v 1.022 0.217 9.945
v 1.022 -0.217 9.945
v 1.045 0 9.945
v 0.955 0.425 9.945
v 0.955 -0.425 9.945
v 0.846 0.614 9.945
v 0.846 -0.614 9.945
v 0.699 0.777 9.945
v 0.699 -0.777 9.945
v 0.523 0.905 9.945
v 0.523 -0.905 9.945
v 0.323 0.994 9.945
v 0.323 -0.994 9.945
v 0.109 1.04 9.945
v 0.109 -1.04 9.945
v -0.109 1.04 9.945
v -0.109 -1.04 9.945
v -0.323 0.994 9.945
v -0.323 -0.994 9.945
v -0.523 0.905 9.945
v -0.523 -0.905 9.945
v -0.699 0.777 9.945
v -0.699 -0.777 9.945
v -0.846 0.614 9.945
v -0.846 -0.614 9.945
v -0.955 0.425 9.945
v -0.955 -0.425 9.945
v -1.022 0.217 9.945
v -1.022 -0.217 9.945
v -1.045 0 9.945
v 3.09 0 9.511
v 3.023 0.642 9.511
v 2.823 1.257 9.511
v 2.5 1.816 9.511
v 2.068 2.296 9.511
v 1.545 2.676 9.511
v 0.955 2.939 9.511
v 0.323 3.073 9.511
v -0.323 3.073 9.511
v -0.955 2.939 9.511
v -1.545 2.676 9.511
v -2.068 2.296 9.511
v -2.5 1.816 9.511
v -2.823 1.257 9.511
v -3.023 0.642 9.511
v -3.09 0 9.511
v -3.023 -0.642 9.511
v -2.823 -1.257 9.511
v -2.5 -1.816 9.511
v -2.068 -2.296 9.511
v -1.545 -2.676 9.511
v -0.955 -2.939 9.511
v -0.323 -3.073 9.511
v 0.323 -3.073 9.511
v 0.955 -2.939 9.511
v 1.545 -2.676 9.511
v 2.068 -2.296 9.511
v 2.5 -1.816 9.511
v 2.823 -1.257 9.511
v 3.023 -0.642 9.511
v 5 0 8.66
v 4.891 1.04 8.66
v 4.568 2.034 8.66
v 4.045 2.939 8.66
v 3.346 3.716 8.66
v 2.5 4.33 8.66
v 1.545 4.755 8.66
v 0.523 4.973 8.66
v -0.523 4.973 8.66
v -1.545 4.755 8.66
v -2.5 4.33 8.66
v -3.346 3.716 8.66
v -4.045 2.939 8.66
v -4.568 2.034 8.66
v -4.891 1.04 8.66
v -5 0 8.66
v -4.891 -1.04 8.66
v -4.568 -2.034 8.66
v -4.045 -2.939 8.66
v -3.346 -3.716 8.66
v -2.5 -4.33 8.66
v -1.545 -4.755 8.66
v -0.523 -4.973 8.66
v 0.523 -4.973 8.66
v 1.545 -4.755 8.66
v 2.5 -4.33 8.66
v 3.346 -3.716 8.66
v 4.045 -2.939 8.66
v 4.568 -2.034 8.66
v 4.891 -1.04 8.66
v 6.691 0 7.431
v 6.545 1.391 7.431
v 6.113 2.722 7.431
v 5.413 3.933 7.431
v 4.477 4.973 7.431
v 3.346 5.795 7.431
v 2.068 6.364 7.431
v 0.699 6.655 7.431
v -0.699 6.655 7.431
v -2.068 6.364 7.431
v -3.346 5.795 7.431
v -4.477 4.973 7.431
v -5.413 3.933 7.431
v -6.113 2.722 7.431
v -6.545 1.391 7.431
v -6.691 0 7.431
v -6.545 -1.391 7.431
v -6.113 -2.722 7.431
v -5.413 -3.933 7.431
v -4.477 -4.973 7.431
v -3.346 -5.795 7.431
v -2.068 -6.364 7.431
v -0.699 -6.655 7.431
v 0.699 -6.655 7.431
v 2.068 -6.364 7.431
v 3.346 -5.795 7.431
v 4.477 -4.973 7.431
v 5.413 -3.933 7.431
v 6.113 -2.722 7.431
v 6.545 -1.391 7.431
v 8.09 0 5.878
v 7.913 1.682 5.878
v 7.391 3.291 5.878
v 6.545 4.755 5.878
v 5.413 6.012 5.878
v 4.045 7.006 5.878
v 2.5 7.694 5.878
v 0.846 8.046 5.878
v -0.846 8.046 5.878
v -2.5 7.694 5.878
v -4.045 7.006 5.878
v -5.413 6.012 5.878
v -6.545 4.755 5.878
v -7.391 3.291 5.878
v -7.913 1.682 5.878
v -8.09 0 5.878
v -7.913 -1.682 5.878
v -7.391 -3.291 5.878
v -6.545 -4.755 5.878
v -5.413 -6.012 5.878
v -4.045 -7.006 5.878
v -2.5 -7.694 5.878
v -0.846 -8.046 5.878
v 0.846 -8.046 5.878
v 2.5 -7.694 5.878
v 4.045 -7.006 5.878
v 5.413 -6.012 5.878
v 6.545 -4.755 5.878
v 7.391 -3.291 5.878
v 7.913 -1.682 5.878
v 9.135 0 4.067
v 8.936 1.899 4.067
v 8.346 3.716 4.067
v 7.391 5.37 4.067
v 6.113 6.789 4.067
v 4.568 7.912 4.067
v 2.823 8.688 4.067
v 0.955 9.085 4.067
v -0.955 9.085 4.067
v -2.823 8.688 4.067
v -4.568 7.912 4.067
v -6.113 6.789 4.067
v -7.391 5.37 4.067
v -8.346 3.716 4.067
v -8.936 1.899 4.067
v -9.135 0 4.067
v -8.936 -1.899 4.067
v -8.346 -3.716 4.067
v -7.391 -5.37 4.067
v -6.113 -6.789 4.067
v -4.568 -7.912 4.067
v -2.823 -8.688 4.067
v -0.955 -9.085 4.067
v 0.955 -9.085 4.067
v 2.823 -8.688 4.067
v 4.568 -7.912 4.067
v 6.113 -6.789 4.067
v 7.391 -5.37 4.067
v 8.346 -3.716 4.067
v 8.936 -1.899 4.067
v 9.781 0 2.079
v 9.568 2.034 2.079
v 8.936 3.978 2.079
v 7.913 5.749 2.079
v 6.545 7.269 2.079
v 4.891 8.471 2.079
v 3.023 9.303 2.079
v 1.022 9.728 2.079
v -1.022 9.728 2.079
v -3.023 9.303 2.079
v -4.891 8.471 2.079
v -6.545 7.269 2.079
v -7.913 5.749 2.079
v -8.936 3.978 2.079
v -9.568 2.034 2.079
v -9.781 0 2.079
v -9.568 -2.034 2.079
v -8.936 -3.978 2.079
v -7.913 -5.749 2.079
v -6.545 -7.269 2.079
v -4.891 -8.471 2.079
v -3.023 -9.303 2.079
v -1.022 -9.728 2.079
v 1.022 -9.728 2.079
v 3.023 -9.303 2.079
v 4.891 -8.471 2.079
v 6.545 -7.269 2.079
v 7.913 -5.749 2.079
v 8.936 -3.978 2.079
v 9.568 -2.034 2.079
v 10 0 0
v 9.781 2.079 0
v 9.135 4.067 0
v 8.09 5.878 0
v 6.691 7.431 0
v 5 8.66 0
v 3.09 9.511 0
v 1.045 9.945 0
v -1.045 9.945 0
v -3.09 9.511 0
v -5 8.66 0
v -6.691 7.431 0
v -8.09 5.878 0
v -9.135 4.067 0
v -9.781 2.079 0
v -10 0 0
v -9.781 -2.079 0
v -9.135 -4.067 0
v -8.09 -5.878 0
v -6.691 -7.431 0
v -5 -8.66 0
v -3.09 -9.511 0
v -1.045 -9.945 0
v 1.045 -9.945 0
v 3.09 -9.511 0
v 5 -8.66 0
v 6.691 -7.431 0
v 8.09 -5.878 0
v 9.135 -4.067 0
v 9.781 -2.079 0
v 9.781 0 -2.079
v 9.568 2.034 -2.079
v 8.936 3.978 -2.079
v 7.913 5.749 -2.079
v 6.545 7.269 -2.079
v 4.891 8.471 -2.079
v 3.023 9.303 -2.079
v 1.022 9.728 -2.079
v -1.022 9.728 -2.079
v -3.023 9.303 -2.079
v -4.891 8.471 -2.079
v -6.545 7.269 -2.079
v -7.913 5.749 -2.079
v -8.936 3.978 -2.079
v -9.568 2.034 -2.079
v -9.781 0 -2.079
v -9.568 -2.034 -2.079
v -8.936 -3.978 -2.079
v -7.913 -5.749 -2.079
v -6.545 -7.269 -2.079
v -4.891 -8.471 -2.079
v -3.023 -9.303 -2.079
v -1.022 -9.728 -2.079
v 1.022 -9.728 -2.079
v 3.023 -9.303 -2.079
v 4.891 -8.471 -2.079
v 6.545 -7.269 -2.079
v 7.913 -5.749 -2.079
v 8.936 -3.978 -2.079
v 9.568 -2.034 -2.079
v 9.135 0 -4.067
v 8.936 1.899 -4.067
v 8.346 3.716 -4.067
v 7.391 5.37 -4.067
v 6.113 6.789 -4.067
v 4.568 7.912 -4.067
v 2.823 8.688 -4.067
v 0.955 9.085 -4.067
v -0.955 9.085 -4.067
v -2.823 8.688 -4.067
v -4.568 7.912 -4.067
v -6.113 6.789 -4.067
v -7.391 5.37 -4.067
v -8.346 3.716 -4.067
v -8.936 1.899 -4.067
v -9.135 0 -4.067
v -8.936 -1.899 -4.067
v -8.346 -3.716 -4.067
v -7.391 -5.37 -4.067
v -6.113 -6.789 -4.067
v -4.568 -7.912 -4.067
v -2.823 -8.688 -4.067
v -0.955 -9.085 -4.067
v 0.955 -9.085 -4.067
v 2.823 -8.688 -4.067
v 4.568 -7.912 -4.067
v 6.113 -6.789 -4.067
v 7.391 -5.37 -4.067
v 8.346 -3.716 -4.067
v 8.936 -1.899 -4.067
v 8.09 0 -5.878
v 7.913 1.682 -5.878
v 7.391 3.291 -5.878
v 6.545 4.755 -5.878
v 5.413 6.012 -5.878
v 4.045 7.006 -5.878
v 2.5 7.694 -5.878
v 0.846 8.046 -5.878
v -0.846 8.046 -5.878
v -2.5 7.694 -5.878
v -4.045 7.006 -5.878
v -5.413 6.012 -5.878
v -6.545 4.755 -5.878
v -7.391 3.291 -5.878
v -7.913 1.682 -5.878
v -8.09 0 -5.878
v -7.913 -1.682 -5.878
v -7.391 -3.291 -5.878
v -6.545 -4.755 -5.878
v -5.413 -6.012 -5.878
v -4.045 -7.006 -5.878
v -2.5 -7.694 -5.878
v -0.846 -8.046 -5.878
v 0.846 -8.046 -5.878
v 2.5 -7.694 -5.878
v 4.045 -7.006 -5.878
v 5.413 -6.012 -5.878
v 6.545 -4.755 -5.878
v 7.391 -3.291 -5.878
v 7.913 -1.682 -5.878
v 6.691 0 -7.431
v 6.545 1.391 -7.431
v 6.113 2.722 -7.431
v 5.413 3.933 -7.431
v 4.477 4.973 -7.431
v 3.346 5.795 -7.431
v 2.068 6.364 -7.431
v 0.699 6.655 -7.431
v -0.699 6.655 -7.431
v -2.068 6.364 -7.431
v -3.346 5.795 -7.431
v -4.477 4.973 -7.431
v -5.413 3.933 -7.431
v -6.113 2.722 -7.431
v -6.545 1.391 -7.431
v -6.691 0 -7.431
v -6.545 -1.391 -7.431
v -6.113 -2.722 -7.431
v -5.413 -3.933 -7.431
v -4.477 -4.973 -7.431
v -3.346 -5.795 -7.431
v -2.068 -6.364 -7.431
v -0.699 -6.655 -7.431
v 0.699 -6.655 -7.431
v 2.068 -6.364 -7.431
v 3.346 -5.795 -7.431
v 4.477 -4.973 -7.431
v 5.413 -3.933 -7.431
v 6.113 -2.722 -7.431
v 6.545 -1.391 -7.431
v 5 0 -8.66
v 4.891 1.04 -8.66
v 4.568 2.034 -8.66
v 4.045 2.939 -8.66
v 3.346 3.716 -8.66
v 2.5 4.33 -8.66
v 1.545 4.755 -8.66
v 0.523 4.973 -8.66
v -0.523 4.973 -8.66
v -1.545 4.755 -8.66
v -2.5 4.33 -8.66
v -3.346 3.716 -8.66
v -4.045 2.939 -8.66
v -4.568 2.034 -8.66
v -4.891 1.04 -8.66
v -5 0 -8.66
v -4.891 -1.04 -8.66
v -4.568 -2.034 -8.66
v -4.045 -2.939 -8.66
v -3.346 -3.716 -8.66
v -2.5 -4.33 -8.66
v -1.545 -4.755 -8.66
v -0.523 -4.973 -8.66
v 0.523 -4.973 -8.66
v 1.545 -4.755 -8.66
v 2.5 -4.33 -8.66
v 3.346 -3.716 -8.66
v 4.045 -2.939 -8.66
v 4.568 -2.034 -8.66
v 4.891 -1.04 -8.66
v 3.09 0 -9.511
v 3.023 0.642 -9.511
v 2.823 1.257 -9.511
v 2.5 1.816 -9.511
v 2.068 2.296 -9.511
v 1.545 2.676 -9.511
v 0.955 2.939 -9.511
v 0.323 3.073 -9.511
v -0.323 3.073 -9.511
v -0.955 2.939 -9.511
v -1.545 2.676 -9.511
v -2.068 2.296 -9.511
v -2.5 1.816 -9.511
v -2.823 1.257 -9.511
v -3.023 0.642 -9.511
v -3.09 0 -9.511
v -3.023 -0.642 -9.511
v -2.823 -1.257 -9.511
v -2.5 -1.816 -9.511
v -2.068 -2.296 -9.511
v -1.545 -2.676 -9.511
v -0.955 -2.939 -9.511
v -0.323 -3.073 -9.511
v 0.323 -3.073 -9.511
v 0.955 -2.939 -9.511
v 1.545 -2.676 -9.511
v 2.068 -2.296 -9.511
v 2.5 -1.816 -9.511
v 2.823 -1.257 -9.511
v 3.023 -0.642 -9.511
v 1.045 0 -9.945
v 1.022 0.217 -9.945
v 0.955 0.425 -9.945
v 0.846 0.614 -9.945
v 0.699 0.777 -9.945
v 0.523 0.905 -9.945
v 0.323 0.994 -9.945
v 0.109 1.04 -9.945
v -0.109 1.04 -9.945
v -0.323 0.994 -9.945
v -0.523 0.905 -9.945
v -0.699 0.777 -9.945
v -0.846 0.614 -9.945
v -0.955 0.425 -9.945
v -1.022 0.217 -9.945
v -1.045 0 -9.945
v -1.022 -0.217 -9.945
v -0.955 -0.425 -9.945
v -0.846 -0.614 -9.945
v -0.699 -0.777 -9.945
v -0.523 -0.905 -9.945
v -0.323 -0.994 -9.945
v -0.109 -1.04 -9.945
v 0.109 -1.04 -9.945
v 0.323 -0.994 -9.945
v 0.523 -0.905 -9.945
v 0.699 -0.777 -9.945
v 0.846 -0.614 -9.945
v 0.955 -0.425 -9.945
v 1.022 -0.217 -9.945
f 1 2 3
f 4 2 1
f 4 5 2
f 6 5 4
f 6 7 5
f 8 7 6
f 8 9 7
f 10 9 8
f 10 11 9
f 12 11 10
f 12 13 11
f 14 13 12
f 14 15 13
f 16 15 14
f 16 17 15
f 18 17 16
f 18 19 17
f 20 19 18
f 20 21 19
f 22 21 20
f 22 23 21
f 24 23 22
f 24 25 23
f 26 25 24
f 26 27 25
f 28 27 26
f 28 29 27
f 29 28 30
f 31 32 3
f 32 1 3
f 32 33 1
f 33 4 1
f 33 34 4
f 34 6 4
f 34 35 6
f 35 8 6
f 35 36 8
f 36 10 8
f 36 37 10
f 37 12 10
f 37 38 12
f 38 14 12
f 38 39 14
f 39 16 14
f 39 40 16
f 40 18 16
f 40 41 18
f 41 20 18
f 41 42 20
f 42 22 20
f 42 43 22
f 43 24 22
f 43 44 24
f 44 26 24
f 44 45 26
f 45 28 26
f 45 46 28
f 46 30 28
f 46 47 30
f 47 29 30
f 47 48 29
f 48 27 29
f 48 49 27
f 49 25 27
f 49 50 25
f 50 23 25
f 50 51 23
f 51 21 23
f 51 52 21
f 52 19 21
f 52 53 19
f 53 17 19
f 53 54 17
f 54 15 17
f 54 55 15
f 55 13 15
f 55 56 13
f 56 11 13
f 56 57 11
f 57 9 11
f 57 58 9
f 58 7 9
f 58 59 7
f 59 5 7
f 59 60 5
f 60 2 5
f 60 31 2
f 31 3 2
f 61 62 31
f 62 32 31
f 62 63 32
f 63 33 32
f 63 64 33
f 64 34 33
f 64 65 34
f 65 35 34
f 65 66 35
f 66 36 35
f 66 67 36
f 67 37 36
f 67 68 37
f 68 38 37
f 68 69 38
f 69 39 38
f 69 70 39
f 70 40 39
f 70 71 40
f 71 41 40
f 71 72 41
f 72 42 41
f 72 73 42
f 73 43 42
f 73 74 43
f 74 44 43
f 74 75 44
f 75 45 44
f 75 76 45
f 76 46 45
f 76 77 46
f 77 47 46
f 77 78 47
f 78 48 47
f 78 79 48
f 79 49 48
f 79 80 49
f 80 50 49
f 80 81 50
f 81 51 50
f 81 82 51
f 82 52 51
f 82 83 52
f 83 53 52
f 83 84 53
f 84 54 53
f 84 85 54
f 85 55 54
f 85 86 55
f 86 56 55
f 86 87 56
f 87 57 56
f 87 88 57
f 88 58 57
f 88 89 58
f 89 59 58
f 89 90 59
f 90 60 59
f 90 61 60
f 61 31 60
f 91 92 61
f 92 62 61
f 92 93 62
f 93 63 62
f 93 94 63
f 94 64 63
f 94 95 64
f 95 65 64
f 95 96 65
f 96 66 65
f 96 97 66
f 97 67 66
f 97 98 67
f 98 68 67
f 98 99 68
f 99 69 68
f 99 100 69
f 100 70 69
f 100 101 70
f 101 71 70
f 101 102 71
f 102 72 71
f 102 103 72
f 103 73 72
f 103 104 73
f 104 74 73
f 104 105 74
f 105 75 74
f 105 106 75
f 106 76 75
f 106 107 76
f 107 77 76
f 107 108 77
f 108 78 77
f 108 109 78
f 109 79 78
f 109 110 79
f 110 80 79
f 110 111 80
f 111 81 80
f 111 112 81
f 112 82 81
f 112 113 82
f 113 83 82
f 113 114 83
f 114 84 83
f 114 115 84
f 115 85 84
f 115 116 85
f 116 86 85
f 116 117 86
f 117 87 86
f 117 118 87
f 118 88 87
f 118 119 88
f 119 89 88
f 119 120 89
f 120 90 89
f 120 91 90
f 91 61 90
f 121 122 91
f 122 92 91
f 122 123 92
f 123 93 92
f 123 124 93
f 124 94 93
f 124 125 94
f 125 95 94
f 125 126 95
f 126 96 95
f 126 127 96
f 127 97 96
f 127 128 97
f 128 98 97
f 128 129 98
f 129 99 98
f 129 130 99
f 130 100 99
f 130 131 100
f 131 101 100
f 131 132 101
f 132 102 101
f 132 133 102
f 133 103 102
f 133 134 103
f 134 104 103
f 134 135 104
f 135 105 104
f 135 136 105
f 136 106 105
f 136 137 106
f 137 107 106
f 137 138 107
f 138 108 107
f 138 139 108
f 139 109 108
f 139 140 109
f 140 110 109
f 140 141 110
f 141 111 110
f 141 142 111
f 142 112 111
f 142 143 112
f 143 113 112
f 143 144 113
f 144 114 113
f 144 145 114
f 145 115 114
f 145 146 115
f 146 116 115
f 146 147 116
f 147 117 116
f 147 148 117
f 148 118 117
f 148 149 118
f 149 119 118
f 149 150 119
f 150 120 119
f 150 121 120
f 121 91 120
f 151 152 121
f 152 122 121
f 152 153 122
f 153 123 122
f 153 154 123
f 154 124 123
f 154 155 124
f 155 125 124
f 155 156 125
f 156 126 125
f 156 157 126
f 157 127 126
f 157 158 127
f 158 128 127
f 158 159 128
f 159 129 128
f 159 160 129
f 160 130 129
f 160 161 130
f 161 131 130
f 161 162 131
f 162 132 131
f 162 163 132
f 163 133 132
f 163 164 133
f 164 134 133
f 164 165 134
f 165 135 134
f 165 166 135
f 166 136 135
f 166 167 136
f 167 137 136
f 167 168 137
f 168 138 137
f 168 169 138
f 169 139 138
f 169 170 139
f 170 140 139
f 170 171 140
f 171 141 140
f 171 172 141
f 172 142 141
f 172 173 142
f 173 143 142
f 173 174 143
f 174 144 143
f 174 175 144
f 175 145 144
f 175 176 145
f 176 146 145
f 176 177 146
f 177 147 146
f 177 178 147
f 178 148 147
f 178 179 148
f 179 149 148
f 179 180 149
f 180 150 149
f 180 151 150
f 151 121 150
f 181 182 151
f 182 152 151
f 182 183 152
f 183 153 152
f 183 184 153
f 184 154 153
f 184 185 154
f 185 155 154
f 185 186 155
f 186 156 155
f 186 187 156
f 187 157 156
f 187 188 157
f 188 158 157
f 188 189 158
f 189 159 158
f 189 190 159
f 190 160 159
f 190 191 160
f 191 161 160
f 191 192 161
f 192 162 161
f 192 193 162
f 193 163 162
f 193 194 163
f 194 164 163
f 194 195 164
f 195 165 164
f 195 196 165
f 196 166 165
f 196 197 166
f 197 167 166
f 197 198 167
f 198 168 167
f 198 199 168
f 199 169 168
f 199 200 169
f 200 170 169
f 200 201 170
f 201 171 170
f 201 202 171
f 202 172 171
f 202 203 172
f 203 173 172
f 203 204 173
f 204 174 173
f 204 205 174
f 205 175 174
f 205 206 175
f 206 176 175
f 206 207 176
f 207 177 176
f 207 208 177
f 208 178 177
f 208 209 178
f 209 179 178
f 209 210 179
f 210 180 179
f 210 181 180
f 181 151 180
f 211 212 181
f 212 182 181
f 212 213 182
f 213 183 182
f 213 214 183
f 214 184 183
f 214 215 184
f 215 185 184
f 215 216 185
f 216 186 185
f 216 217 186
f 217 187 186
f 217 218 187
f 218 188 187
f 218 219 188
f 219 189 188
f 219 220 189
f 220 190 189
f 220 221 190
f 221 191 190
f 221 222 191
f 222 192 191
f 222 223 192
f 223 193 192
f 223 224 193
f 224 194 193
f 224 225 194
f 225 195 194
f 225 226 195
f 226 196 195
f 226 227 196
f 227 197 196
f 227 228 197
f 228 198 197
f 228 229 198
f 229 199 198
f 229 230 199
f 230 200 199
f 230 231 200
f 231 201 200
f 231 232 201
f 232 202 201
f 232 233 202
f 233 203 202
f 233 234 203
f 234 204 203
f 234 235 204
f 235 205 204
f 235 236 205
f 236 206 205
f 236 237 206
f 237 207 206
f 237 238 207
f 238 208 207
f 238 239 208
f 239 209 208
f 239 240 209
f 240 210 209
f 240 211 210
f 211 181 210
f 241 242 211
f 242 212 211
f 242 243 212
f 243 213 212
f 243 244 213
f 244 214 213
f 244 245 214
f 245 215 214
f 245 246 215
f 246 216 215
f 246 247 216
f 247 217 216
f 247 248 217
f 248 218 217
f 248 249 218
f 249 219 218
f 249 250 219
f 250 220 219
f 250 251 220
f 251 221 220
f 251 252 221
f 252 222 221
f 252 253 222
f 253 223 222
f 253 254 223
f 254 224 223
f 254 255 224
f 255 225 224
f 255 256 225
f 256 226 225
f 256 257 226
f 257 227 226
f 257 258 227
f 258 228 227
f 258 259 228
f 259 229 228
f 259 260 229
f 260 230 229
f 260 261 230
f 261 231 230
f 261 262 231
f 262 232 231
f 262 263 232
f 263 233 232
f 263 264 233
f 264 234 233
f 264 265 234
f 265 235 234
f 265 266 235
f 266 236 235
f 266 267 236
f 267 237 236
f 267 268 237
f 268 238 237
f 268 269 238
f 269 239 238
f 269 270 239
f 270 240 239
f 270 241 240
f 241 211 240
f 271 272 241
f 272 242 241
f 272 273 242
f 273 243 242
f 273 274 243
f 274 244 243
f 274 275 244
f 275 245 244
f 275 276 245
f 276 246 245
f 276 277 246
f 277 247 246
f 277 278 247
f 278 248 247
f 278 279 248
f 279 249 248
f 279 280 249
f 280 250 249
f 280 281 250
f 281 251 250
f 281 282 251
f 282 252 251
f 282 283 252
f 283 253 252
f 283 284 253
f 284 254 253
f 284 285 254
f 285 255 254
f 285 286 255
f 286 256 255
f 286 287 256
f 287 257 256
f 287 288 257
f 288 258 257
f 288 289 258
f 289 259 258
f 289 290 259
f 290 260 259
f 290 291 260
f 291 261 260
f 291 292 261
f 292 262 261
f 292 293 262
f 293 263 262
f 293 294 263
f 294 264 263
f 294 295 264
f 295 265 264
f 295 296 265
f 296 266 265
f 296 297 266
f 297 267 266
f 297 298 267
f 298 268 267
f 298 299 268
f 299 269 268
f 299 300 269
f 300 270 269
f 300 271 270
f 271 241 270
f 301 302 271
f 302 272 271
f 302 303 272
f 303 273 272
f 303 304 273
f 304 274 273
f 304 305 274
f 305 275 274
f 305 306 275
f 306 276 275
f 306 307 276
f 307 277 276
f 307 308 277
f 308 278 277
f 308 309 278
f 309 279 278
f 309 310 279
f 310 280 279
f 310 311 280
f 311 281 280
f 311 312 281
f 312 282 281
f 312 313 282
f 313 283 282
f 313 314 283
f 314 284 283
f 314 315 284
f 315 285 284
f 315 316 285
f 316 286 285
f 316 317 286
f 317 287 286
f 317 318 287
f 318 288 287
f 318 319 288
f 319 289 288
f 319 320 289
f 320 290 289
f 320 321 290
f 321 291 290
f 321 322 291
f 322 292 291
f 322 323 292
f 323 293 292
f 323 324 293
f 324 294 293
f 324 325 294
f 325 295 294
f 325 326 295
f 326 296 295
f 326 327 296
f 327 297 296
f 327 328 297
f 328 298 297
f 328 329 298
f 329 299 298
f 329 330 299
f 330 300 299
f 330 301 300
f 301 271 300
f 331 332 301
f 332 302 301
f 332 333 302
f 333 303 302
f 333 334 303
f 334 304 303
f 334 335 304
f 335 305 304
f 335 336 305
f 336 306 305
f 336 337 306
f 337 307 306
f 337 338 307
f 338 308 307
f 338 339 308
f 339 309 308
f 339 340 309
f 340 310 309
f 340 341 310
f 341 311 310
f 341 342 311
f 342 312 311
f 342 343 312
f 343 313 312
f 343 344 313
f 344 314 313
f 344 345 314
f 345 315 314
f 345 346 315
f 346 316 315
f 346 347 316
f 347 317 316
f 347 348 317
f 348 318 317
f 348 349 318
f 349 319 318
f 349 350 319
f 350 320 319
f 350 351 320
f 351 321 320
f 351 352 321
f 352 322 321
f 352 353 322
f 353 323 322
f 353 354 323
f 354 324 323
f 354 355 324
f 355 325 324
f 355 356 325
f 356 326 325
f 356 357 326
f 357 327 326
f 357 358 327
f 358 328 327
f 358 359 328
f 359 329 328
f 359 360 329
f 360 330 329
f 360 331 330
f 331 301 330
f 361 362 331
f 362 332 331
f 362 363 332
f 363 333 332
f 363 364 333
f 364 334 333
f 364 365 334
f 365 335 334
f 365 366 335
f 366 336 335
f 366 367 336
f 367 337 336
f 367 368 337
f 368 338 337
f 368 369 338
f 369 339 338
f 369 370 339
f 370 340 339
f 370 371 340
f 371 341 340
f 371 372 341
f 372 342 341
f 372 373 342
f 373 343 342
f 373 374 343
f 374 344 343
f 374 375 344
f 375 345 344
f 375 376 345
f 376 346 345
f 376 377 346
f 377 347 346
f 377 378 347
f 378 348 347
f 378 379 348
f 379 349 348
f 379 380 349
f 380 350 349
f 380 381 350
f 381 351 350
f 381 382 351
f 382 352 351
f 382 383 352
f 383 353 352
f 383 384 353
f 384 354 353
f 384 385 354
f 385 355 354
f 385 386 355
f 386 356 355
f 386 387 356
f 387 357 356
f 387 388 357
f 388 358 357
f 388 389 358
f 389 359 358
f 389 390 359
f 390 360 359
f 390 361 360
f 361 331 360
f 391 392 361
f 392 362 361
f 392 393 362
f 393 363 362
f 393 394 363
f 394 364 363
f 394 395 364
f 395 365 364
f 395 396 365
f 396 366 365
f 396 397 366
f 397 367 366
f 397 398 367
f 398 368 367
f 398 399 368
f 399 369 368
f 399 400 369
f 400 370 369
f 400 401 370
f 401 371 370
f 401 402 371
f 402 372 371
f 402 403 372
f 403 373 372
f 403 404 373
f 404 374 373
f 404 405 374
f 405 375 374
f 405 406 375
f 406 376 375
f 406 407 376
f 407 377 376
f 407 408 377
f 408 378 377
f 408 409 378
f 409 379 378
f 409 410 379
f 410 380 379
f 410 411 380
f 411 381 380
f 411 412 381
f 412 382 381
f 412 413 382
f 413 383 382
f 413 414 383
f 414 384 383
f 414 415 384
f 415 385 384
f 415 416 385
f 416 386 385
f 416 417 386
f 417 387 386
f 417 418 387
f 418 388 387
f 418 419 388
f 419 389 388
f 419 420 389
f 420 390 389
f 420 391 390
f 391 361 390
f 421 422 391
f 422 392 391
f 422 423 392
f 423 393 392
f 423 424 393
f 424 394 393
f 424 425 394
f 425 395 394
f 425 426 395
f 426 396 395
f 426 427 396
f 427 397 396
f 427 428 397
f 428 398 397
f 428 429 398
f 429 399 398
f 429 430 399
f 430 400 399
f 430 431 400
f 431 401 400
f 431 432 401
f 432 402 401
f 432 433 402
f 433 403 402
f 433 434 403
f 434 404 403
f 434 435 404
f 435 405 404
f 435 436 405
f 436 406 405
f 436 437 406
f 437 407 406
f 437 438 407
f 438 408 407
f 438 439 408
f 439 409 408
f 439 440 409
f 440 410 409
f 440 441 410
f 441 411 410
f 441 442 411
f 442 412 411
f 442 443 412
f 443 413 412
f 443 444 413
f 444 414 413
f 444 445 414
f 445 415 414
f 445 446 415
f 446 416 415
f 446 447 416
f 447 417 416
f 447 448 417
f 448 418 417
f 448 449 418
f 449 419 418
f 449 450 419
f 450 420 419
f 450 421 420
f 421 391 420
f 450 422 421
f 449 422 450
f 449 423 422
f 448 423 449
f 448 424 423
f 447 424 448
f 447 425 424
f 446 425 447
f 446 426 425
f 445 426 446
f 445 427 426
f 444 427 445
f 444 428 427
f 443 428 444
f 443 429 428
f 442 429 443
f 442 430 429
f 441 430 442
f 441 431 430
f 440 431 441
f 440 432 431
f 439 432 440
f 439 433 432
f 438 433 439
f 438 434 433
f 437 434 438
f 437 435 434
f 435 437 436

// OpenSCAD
// Generated by CadMonkey
// Prompt: hey cadmonkey, create me a sphere
// Generated at: 2025-11-10 16:47:21

sphere(r=10);
